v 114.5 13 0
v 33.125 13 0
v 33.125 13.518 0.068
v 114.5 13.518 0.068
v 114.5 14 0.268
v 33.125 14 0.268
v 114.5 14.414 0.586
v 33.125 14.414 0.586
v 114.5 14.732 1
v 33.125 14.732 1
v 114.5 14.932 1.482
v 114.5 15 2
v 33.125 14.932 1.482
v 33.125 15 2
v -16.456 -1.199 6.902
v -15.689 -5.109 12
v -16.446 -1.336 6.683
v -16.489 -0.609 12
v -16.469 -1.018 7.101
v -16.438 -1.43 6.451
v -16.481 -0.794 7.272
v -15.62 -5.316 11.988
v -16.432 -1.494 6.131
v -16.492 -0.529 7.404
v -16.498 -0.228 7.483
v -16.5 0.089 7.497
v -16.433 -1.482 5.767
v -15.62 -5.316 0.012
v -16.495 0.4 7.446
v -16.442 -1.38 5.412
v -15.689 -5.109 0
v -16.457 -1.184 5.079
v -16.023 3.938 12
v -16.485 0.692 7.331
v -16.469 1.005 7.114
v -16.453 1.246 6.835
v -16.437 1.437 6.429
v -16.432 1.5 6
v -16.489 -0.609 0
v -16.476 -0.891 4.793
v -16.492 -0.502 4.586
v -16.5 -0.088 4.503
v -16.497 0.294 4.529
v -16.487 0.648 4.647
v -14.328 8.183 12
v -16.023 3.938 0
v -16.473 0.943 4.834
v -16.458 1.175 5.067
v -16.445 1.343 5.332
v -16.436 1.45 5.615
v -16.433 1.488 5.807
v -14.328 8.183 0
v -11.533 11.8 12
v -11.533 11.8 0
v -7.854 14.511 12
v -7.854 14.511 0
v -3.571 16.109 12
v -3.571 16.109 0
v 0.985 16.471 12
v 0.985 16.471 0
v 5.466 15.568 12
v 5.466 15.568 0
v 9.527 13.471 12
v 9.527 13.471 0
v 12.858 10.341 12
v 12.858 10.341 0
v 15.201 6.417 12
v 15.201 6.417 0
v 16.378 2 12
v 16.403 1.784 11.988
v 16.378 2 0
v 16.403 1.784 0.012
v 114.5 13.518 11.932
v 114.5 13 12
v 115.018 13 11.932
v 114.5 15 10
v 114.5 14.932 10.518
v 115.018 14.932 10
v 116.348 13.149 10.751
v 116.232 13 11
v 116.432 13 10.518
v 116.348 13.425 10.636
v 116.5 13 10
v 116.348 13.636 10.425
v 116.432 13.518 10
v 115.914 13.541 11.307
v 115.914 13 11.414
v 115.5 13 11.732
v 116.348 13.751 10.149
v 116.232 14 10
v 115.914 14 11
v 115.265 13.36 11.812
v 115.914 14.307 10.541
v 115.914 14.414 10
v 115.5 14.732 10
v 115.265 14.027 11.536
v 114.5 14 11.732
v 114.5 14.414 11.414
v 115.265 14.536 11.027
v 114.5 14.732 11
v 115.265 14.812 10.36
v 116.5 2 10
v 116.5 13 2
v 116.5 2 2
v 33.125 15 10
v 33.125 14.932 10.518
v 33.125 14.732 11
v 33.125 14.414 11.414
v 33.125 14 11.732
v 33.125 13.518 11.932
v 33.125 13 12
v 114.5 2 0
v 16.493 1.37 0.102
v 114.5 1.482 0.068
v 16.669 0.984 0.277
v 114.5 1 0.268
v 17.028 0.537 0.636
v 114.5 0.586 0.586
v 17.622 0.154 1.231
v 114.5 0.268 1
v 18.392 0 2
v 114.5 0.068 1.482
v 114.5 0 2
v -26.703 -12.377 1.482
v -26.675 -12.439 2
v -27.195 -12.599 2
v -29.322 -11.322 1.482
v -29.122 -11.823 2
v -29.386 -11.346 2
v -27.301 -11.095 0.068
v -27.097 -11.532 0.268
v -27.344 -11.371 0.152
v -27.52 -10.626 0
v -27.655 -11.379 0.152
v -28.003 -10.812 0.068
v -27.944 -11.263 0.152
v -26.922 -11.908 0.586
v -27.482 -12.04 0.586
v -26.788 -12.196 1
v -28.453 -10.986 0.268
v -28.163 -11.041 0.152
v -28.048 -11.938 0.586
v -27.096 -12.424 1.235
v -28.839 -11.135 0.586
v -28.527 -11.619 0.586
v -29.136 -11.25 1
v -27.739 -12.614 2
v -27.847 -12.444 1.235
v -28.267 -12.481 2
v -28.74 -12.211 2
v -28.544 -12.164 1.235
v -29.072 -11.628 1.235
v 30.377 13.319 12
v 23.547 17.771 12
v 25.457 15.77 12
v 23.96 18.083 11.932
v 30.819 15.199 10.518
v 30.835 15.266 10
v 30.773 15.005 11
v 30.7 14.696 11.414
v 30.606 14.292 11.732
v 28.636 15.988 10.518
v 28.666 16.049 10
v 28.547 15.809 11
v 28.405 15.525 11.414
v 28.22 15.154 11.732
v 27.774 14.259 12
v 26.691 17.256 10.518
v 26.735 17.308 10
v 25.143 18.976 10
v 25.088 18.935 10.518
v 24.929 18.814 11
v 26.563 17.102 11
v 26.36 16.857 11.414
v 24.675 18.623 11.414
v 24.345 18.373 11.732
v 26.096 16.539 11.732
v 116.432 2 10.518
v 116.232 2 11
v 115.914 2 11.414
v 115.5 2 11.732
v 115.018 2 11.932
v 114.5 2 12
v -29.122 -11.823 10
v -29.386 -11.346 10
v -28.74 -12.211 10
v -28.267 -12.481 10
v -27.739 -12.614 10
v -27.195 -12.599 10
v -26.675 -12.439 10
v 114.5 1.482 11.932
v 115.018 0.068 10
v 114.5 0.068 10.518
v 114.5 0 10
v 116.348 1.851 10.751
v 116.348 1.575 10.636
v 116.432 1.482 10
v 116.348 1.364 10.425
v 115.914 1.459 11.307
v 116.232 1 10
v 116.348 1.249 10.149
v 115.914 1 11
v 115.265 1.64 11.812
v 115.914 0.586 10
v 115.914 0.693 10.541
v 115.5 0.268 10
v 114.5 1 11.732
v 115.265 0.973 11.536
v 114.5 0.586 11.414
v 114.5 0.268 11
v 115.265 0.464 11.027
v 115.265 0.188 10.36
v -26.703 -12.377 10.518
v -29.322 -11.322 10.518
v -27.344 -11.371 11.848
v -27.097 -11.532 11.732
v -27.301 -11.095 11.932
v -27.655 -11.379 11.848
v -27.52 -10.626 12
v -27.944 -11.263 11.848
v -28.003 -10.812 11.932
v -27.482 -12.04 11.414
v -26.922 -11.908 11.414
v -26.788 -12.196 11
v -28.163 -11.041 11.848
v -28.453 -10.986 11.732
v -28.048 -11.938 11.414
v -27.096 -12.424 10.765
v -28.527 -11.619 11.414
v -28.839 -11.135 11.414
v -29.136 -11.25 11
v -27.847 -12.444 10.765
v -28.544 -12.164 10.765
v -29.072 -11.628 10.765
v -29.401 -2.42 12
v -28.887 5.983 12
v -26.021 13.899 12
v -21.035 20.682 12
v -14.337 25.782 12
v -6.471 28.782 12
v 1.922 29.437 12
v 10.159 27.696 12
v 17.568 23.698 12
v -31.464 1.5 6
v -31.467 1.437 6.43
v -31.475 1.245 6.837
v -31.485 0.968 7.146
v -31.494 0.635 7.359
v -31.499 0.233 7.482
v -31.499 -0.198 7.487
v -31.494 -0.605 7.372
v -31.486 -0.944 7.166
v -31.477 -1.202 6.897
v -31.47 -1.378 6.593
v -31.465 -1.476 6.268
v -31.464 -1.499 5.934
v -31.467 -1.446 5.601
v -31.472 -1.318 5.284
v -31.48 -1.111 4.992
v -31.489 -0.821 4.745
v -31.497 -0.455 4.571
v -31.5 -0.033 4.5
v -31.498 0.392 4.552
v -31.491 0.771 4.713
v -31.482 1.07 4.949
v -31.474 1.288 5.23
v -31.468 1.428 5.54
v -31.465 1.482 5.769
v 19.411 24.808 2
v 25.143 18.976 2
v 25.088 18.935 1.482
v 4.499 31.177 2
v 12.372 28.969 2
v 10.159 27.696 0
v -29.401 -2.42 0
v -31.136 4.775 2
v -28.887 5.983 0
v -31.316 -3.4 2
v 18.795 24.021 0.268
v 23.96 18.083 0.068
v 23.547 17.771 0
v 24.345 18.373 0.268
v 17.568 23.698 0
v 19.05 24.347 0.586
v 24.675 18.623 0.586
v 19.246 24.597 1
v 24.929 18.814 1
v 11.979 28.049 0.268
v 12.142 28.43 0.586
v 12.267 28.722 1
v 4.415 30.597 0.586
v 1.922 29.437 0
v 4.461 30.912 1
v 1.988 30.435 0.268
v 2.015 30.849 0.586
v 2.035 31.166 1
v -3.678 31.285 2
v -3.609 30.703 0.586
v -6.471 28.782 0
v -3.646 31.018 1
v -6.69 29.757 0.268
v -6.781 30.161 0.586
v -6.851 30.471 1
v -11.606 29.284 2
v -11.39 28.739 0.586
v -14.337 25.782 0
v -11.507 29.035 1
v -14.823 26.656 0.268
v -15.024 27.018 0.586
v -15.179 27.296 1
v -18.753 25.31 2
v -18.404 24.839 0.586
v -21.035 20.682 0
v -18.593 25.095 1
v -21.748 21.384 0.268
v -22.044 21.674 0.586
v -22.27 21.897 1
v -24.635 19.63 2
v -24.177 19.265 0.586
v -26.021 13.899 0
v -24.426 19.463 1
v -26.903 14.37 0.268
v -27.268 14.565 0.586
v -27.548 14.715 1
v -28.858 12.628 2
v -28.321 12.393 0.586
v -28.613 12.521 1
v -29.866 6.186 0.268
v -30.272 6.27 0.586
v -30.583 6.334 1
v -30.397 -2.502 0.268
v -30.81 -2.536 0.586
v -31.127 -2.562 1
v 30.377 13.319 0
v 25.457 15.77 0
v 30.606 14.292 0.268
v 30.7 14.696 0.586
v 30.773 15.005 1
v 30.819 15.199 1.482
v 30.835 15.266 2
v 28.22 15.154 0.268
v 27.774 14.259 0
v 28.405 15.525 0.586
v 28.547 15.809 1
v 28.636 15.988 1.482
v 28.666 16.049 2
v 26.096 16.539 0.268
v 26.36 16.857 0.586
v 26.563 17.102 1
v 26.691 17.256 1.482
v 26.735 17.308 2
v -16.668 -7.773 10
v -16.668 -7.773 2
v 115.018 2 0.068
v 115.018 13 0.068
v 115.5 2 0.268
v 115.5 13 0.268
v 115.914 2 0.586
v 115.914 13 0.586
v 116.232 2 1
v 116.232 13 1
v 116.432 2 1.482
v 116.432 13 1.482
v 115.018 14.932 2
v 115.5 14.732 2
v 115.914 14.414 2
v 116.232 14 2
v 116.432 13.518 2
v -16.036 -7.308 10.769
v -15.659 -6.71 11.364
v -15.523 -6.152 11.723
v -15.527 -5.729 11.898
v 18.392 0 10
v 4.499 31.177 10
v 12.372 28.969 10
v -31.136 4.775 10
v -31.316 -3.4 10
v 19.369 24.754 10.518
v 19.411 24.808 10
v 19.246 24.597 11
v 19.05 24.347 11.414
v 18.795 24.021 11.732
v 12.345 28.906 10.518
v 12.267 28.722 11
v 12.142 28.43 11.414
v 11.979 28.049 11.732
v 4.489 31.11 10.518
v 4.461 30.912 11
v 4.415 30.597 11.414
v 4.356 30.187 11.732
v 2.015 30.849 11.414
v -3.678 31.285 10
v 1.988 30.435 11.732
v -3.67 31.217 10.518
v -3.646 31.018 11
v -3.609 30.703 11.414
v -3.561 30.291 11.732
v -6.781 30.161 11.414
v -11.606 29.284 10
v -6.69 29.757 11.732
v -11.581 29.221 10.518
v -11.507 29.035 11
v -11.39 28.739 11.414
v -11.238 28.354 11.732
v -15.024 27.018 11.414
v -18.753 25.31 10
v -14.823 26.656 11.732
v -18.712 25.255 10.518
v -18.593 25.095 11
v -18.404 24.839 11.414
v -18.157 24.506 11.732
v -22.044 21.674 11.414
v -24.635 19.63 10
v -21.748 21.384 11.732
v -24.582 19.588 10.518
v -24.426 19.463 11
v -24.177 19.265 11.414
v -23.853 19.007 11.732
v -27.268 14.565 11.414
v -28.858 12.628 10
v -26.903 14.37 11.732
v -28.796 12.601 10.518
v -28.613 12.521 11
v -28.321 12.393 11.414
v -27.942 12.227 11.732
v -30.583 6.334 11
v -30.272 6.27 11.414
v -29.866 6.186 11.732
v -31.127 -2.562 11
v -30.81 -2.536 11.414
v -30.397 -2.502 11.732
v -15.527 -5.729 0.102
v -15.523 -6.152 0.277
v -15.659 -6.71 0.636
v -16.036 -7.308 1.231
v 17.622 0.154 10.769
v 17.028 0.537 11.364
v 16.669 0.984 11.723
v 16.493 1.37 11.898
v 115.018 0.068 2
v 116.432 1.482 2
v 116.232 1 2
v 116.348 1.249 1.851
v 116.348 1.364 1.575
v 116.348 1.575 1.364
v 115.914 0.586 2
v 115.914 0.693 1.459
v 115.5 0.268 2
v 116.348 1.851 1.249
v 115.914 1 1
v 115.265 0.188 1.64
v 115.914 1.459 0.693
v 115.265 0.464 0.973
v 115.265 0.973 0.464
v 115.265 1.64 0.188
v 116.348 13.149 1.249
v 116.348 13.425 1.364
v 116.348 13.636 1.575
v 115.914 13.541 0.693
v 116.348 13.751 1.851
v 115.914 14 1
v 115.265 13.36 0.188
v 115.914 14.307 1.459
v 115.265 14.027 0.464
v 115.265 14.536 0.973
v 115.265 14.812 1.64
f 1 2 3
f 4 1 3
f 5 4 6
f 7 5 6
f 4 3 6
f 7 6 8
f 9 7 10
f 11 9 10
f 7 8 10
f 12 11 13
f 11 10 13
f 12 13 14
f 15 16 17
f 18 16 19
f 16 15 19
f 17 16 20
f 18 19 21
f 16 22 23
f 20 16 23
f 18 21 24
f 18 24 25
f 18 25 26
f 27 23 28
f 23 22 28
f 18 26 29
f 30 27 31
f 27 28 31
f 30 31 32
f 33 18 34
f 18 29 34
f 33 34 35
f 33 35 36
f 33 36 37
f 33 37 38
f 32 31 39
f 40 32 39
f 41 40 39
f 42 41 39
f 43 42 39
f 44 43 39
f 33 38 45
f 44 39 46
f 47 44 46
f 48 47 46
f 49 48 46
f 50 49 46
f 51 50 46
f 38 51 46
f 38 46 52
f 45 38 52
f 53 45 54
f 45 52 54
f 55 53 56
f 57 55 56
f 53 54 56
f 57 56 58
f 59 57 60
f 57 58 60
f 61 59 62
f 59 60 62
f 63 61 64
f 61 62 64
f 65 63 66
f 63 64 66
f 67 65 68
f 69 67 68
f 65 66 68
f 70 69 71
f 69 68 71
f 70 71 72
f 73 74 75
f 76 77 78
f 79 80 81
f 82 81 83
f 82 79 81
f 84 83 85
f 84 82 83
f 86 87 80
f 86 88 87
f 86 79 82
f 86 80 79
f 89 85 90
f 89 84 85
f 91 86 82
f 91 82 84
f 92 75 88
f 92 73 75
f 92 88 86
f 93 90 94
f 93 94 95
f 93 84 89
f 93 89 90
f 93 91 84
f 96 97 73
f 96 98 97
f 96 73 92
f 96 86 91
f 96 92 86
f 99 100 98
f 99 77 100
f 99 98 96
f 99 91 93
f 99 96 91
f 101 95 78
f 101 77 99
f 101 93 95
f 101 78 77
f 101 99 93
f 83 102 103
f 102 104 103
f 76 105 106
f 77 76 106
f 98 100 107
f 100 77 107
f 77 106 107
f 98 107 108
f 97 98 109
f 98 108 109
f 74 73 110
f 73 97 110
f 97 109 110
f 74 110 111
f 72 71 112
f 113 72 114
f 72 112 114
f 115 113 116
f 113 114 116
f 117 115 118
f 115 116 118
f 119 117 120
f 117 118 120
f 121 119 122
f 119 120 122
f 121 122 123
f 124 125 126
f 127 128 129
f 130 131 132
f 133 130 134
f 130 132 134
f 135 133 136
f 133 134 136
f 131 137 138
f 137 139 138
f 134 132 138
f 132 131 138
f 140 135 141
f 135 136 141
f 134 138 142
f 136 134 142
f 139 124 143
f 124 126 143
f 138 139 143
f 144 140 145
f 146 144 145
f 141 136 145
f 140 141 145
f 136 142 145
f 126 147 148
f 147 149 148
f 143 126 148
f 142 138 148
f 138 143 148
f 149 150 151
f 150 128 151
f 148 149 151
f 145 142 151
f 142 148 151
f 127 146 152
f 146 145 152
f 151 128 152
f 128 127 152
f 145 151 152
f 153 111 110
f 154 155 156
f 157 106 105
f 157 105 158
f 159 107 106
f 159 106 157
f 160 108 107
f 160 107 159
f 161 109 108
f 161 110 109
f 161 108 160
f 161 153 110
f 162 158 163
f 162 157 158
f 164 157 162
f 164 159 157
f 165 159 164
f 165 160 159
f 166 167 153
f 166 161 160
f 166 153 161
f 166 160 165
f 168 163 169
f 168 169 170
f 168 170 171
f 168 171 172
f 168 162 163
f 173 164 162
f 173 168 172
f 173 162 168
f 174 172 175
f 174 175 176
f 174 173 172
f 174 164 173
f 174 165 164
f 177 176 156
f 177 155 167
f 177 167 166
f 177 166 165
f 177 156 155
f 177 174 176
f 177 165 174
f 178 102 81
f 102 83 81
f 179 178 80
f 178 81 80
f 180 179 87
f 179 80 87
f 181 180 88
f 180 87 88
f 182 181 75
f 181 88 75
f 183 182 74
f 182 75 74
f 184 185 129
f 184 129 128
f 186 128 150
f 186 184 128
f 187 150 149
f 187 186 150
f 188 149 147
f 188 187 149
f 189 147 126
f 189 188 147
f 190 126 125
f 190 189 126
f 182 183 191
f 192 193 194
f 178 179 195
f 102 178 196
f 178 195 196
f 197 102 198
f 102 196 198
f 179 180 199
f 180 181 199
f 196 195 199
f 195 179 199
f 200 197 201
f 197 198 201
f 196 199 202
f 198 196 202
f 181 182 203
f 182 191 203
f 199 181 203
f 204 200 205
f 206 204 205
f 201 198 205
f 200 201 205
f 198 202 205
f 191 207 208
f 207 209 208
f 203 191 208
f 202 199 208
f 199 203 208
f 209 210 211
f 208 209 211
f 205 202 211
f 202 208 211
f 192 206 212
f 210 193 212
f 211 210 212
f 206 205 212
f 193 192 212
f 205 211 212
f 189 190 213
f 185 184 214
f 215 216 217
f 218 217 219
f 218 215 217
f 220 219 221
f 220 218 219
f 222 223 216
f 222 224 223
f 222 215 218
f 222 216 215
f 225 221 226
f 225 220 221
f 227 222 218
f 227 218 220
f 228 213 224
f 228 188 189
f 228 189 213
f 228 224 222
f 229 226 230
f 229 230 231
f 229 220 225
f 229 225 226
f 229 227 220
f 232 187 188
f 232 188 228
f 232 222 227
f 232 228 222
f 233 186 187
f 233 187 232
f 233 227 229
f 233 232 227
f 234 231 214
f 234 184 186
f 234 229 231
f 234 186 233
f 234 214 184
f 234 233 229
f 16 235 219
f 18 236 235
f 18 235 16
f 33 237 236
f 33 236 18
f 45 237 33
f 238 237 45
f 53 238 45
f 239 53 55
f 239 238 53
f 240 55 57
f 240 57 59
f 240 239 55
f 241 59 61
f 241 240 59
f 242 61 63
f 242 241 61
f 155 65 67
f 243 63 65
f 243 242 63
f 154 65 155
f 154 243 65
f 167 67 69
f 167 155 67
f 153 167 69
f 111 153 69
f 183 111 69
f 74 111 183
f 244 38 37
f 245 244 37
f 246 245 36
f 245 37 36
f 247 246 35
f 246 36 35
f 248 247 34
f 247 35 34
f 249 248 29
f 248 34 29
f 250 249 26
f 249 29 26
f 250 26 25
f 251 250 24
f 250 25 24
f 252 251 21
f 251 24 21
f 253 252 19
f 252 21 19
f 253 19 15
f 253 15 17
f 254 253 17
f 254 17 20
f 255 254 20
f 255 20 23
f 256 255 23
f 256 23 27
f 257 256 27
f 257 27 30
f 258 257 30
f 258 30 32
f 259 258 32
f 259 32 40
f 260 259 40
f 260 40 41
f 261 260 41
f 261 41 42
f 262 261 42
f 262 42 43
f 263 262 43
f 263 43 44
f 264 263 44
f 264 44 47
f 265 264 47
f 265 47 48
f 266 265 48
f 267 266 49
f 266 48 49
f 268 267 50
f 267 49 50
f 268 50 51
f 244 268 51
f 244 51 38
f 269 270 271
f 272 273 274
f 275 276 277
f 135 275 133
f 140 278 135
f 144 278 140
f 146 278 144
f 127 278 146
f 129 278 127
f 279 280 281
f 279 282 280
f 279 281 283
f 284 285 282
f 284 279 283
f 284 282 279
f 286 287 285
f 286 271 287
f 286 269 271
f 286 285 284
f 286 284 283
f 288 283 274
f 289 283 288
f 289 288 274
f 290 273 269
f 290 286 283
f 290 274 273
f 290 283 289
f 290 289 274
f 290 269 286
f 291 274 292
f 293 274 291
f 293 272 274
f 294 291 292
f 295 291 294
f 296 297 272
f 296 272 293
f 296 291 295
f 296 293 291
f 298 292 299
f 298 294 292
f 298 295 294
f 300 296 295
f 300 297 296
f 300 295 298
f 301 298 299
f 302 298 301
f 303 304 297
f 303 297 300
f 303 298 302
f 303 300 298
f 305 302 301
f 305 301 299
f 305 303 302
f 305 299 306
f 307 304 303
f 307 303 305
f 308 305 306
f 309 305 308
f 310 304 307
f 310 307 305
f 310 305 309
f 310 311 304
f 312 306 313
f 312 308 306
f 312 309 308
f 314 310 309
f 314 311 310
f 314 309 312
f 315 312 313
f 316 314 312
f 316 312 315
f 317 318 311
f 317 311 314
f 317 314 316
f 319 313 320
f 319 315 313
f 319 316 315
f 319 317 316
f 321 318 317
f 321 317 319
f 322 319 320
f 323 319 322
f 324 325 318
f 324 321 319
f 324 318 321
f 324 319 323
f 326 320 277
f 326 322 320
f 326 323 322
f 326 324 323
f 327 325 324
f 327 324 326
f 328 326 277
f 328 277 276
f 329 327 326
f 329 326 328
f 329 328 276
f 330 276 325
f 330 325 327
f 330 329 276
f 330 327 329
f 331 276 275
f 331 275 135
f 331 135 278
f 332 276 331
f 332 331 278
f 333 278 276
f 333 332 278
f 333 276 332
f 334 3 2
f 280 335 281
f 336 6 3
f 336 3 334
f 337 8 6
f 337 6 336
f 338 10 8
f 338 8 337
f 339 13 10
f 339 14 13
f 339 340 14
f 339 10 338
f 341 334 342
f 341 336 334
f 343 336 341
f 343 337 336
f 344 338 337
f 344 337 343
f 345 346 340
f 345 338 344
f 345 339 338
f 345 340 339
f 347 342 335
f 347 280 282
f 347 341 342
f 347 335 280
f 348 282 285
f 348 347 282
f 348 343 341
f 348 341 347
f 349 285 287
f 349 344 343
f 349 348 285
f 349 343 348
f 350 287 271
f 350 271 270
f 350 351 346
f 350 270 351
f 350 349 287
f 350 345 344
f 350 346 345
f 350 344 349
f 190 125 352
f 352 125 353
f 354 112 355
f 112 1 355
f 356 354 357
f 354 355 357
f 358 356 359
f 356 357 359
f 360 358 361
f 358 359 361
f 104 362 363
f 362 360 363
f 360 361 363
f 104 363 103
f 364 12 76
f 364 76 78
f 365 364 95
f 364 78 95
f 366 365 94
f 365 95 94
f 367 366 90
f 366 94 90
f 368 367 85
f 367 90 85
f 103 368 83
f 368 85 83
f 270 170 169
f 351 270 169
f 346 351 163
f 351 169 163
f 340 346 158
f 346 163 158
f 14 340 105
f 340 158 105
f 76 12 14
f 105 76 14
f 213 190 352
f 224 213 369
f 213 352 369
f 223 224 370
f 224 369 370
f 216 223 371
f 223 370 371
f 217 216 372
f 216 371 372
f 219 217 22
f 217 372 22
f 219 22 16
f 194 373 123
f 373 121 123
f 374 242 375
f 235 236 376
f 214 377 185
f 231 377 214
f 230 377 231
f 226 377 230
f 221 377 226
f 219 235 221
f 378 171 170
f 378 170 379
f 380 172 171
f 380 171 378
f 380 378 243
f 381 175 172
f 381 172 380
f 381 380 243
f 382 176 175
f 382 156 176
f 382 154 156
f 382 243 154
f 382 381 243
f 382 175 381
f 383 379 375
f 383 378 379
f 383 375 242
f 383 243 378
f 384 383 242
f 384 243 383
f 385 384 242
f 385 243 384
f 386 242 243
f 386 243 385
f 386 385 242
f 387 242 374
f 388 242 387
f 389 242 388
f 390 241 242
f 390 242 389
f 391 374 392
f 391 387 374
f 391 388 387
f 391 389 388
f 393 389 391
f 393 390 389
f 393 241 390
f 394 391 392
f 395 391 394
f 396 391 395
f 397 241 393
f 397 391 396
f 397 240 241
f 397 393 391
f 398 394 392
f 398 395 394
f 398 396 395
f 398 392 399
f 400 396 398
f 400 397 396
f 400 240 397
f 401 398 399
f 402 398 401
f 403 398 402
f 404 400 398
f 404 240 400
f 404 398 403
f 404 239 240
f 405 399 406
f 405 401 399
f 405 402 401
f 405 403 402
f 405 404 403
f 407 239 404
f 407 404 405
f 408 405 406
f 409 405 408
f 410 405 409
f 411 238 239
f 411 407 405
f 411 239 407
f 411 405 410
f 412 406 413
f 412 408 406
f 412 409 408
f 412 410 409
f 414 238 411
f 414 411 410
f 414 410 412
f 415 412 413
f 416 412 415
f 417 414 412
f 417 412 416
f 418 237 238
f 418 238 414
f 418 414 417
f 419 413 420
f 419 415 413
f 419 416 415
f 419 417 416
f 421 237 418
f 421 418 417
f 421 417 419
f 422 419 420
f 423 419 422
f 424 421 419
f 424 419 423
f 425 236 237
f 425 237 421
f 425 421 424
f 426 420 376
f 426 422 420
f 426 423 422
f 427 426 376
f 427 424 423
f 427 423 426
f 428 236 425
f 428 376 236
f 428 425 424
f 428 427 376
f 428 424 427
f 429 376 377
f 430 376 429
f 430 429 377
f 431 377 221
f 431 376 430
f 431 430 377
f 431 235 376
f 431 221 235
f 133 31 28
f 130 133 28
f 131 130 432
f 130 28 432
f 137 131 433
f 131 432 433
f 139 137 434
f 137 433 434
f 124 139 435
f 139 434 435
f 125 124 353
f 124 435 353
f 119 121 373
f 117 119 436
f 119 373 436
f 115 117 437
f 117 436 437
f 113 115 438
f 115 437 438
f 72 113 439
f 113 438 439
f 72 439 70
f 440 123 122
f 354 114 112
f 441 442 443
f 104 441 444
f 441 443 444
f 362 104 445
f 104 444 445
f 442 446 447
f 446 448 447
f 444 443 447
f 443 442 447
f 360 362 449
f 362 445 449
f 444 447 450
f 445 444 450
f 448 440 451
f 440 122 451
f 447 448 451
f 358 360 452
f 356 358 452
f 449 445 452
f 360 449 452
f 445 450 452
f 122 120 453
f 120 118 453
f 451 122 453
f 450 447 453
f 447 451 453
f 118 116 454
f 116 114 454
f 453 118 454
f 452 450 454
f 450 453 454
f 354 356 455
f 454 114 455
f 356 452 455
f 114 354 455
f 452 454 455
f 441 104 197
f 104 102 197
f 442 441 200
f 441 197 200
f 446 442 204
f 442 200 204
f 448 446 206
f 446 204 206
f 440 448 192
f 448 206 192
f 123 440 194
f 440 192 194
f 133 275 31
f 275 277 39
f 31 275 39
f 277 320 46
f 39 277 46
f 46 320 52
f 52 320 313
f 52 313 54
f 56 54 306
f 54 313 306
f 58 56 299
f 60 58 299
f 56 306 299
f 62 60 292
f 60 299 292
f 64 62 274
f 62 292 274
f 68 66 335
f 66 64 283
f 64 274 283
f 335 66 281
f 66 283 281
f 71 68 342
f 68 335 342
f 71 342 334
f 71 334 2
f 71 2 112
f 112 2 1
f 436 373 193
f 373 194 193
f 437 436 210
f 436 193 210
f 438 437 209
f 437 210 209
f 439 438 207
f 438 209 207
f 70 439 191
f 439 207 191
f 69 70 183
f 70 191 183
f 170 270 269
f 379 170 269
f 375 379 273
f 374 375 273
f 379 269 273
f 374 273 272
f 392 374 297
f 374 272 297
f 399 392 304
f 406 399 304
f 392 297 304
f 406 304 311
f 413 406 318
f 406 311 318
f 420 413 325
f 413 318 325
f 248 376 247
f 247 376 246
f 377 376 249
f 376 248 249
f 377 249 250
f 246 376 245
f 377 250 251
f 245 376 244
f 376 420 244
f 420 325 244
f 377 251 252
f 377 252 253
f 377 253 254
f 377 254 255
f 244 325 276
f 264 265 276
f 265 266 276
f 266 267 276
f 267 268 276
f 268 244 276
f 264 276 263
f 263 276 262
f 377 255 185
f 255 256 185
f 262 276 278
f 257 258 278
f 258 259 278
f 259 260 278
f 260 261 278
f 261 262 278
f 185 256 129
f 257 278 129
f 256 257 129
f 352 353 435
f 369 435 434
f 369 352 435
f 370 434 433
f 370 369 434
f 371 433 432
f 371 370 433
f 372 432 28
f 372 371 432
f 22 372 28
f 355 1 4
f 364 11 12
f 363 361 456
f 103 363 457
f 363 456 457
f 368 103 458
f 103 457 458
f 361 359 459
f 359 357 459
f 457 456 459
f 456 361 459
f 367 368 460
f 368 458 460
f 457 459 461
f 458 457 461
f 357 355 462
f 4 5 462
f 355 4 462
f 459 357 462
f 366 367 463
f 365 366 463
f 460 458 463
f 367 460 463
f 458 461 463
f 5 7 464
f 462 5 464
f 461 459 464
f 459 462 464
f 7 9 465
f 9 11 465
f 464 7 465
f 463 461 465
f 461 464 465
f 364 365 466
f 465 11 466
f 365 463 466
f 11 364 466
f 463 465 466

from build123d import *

# Parameters (mm, degrees)
F1_DEPTH = 12
F2_R     = 1.5
F3_DEPTH = 50
F4_R     = 10
F5_R     = 2


with BuildPart() as f1:
    # F0 (on Top) → F1 (new body)
    with BuildSketch(Plane.XY):
        with BuildLine():
            ThreePointArc((-14.954078, -6.973201), (-3.571254, 16.108884), (16.5, 0))
            Line((16.5, 0), (116.5, 0))
            Line((116.5, 0), (116.5, 15))
            Line((116.5, 15), (27.699278, 15))
            ThreePointArc((27.699278, 15), (-14.162607, 28.136641), (-28.548695, -13.312475))
            Line((-28.548695, -13.312475), (-14.954078, -6.973201))
        make_face()
    extrude(amount=F1_DEPTH)

    # F2 (on Right) → F3 (cut)
    with BuildSketch(Plane.YZ):
        with Locations((0, 6)):
            Circle(F2_R)
    extrude(amount=-F3_DEPTH, mode=Mode.SUBTRACT)

    # F4
    f4_edges = [f1.edges().sort_by_distance(p)[0] for p in [
        (27.699278, 15, 6),
    ]]
    fillet(f4_edges, radius=F4_R)

    # F5
    f5_edges = [f1.edges().sort_by_distance(p)[0] for p in [
        (-16.233753, 26.994727, 12),
        (74.812382, 15, 12),
        (66.5, 0, 12),
        (116.5, 7.5, 12),
        (66.5, 0, 0),
        (116.5, 0, 6),
        (-16.233753, 26.994727, 0),
        (-28.548695, -13.312475, 6),
        (74.812382, 15, 0),
        (116.5, 7.5, 0),
        (116.5, 15, 6),
        (-21.751387, -10.142838, 0),
        (-21.751387, -10.142838, 12),
        (-14.954078, -6.973201, 6),
        (16.5, 0, 6),
    ]]
    fillet(f5_edges, radius=F5_R)


solid = f1.part
